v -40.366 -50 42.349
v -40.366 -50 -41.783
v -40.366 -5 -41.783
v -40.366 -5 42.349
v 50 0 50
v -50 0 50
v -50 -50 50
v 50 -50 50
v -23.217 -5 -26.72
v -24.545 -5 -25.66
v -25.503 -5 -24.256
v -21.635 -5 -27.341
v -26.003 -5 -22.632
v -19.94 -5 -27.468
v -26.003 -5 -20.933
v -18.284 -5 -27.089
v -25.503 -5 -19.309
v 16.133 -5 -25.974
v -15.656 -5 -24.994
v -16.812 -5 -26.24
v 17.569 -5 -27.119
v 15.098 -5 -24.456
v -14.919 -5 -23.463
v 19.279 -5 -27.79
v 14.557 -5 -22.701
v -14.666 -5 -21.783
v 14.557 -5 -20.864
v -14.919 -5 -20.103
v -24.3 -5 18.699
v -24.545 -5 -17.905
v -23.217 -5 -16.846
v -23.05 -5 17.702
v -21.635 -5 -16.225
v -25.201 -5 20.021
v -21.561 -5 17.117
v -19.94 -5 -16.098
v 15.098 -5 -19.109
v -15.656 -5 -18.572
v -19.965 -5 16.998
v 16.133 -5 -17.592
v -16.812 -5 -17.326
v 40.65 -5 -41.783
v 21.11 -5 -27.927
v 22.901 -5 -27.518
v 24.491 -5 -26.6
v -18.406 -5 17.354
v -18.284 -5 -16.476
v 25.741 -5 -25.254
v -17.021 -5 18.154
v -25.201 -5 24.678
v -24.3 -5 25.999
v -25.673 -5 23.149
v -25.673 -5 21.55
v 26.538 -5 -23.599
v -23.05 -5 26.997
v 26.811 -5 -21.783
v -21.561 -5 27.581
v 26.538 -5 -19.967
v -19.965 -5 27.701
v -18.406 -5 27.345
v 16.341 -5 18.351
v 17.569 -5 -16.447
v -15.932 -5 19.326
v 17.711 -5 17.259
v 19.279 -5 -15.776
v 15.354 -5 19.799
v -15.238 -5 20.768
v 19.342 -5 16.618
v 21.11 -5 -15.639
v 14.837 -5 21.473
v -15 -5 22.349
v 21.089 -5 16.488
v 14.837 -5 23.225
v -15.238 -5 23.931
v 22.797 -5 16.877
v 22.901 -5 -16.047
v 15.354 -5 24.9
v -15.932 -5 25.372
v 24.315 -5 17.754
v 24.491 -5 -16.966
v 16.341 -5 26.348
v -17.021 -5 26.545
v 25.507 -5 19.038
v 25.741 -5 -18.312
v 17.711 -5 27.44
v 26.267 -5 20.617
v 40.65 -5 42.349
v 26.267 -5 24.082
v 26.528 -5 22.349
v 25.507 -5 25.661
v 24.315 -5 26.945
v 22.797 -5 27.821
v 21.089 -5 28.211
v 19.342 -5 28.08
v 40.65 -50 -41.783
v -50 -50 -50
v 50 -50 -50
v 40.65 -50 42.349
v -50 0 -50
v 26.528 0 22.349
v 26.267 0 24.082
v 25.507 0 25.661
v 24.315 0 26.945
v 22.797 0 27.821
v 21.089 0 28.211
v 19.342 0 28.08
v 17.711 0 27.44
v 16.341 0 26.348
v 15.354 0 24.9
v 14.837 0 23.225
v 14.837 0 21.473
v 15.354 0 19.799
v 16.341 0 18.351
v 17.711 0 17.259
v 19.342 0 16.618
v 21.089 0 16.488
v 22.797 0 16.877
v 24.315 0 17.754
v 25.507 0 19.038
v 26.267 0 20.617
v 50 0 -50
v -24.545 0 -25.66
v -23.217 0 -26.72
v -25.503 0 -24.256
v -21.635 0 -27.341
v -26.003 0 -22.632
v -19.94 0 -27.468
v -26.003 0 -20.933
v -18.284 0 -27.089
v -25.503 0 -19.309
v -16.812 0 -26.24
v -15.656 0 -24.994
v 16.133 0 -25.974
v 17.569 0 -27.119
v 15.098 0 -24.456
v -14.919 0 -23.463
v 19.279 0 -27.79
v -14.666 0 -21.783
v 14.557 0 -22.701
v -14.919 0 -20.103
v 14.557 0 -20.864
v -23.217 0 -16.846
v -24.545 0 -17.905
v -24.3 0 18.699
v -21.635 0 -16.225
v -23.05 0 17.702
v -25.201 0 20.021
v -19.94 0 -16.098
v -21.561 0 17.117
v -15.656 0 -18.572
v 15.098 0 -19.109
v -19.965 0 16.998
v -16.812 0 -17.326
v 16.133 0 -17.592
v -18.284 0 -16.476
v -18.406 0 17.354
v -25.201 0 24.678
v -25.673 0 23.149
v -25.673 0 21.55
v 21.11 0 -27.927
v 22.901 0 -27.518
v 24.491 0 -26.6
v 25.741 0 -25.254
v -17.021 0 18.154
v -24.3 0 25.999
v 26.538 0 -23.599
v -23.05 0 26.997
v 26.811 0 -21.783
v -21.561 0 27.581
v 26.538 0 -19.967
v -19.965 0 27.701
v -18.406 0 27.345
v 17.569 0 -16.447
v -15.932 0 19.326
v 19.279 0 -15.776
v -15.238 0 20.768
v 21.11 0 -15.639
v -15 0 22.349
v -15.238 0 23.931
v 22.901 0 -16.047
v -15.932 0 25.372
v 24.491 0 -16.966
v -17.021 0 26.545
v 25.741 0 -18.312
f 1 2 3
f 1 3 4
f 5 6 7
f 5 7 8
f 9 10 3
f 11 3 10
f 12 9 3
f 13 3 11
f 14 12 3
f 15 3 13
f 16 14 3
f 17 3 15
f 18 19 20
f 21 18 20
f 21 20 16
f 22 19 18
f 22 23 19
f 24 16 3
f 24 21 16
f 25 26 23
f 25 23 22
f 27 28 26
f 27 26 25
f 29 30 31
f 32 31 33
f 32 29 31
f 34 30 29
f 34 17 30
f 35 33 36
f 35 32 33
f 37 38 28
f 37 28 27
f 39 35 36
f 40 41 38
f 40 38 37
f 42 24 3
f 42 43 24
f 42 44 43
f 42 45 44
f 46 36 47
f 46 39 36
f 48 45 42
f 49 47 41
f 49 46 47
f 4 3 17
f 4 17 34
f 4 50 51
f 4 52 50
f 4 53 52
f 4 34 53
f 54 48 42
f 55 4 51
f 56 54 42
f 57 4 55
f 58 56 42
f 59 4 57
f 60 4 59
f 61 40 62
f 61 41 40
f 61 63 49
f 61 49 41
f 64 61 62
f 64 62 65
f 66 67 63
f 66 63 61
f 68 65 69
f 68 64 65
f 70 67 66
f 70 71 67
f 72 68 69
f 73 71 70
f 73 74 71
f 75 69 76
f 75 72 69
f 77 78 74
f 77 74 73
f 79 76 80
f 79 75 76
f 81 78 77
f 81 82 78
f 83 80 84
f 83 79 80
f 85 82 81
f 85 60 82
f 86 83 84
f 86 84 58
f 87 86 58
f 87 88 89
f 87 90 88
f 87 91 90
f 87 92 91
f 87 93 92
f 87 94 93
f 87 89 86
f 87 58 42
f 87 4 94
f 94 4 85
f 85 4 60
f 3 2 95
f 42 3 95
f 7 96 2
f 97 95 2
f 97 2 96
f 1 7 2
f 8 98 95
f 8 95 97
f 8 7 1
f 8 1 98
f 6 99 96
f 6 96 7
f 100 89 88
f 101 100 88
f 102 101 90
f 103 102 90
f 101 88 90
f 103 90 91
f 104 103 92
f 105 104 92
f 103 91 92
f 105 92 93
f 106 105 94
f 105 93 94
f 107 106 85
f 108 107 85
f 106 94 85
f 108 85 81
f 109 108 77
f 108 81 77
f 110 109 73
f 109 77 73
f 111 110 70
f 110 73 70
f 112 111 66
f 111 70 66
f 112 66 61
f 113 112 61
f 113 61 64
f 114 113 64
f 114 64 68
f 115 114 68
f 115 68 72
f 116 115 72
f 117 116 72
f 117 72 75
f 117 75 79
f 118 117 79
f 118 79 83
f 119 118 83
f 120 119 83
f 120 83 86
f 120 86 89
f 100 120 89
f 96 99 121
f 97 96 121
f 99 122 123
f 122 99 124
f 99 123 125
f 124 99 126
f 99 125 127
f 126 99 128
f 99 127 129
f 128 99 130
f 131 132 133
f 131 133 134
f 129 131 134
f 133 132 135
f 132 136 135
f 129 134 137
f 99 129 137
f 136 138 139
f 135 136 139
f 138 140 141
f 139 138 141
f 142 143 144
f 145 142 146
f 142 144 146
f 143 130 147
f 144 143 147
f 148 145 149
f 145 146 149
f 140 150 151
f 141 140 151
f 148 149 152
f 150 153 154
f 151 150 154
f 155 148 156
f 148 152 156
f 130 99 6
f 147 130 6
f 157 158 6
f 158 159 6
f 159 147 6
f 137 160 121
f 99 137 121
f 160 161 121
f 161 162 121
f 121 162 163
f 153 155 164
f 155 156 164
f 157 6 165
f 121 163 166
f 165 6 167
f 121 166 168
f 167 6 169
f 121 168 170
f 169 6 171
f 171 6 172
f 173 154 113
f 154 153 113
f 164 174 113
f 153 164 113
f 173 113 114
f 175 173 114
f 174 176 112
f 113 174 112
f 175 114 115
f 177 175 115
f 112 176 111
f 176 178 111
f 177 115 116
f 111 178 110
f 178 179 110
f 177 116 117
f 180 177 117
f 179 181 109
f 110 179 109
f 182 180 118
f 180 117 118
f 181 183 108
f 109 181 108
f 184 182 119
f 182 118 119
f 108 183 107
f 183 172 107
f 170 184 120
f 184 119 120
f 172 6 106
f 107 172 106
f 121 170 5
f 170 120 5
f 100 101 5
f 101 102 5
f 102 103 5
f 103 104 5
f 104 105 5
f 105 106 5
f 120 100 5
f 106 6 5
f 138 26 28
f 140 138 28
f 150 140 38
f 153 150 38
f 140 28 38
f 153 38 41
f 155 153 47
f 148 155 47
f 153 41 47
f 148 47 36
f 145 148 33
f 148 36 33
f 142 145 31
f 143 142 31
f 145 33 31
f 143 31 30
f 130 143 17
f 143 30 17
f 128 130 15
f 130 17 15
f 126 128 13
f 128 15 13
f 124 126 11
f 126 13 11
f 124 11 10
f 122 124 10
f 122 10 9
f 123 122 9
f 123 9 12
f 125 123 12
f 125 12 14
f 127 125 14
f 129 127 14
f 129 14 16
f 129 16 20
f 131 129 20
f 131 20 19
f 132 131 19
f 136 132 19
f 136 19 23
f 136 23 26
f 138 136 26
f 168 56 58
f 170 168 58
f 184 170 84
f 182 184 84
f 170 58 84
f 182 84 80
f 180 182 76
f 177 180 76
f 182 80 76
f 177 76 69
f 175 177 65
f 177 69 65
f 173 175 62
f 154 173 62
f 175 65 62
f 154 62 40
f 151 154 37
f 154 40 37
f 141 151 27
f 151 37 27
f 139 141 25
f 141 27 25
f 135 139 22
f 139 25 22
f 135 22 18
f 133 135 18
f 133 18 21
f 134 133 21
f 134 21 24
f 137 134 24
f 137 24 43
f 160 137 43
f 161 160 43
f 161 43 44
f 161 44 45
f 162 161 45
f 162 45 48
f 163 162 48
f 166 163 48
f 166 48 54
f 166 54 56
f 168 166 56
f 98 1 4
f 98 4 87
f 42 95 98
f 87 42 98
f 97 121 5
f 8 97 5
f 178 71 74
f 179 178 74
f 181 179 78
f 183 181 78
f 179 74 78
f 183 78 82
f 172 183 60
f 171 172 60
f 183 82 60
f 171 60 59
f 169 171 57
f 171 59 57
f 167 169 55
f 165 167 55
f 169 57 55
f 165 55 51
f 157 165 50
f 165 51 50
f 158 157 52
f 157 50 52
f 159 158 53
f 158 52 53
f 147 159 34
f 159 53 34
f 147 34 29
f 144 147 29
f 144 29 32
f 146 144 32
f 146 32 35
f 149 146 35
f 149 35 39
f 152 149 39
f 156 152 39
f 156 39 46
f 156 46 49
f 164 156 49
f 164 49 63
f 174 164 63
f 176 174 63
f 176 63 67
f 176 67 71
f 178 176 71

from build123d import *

# Parameters (mm, degrees)
F0_W     = 100
F0_H     = 100
F1_DEPTH = 50
F2_W     = 81.016191
F2_H     = 84.132194
F3_DEPTH = 45
F5_R     = 5.36646
F5_R_2   = 5.878275
F5_R_3   = 6.161524
F5_R_4   = 5.700697
F6_DEPTH = 25
F4_R     = 5.700697
F4_R_2   = 5.36646
F4_R_3   = 5.878275
F4_R_4   = 6.161524
F7_DEPTH = 19.5


with BuildPart() as f1:
    # F0 (on Front) → F1 (new body)
    with BuildSketch(Plane.XZ):
        Rectangle(F0_W, F0_H)
    extrude(amount=F1_DEPTH)

    # F2 (on face) → F3 (cut)
    with BuildSketch(Plane.XZ.offset(50)):
        with Locations((0.141635, 0.283275)):
            Rectangle(F2_W, F2_H)
    extrude(amount=-F3_DEPTH, mode=Mode.SUBTRACT)

    # F5 (on face) → F6 (cut)
    with BuildSketch(Plane.XZ.offset(5)):
        with Locations((-20.36646, 22.349372)):
            Circle(F5_R)
        with Locations((20.649731, 22.349372)):
            Circle(F5_R_2)
        with Locations((20.649731, -21.782822)):
            Circle(F5_R_3)
        with Locations((-20.36646, -21.782822)):
            Circle(F5_R_4)
    extrude(amount=-F6_DEPTH, mode=Mode.SUBTRACT)

    # F4 (on face) → F7 (cut)
    with BuildSketch(Plane.XZ.offset(5)):
        with Locations((-20.36646, -21.782822)):
            Circle(F4_R)
        with Locations((-20.36646, 22.349372)):
            Circle(F4_R_2)
        with Locations((20.649731, 22.349372)):
            Circle(F4_R_3)
        with Locations((20.649731, -21.782822)):
            Circle(F4_R_4)
    extrude(amount=-F7_DEPTH, mode=Mode.SUBTRACT)


solid = f1.part
